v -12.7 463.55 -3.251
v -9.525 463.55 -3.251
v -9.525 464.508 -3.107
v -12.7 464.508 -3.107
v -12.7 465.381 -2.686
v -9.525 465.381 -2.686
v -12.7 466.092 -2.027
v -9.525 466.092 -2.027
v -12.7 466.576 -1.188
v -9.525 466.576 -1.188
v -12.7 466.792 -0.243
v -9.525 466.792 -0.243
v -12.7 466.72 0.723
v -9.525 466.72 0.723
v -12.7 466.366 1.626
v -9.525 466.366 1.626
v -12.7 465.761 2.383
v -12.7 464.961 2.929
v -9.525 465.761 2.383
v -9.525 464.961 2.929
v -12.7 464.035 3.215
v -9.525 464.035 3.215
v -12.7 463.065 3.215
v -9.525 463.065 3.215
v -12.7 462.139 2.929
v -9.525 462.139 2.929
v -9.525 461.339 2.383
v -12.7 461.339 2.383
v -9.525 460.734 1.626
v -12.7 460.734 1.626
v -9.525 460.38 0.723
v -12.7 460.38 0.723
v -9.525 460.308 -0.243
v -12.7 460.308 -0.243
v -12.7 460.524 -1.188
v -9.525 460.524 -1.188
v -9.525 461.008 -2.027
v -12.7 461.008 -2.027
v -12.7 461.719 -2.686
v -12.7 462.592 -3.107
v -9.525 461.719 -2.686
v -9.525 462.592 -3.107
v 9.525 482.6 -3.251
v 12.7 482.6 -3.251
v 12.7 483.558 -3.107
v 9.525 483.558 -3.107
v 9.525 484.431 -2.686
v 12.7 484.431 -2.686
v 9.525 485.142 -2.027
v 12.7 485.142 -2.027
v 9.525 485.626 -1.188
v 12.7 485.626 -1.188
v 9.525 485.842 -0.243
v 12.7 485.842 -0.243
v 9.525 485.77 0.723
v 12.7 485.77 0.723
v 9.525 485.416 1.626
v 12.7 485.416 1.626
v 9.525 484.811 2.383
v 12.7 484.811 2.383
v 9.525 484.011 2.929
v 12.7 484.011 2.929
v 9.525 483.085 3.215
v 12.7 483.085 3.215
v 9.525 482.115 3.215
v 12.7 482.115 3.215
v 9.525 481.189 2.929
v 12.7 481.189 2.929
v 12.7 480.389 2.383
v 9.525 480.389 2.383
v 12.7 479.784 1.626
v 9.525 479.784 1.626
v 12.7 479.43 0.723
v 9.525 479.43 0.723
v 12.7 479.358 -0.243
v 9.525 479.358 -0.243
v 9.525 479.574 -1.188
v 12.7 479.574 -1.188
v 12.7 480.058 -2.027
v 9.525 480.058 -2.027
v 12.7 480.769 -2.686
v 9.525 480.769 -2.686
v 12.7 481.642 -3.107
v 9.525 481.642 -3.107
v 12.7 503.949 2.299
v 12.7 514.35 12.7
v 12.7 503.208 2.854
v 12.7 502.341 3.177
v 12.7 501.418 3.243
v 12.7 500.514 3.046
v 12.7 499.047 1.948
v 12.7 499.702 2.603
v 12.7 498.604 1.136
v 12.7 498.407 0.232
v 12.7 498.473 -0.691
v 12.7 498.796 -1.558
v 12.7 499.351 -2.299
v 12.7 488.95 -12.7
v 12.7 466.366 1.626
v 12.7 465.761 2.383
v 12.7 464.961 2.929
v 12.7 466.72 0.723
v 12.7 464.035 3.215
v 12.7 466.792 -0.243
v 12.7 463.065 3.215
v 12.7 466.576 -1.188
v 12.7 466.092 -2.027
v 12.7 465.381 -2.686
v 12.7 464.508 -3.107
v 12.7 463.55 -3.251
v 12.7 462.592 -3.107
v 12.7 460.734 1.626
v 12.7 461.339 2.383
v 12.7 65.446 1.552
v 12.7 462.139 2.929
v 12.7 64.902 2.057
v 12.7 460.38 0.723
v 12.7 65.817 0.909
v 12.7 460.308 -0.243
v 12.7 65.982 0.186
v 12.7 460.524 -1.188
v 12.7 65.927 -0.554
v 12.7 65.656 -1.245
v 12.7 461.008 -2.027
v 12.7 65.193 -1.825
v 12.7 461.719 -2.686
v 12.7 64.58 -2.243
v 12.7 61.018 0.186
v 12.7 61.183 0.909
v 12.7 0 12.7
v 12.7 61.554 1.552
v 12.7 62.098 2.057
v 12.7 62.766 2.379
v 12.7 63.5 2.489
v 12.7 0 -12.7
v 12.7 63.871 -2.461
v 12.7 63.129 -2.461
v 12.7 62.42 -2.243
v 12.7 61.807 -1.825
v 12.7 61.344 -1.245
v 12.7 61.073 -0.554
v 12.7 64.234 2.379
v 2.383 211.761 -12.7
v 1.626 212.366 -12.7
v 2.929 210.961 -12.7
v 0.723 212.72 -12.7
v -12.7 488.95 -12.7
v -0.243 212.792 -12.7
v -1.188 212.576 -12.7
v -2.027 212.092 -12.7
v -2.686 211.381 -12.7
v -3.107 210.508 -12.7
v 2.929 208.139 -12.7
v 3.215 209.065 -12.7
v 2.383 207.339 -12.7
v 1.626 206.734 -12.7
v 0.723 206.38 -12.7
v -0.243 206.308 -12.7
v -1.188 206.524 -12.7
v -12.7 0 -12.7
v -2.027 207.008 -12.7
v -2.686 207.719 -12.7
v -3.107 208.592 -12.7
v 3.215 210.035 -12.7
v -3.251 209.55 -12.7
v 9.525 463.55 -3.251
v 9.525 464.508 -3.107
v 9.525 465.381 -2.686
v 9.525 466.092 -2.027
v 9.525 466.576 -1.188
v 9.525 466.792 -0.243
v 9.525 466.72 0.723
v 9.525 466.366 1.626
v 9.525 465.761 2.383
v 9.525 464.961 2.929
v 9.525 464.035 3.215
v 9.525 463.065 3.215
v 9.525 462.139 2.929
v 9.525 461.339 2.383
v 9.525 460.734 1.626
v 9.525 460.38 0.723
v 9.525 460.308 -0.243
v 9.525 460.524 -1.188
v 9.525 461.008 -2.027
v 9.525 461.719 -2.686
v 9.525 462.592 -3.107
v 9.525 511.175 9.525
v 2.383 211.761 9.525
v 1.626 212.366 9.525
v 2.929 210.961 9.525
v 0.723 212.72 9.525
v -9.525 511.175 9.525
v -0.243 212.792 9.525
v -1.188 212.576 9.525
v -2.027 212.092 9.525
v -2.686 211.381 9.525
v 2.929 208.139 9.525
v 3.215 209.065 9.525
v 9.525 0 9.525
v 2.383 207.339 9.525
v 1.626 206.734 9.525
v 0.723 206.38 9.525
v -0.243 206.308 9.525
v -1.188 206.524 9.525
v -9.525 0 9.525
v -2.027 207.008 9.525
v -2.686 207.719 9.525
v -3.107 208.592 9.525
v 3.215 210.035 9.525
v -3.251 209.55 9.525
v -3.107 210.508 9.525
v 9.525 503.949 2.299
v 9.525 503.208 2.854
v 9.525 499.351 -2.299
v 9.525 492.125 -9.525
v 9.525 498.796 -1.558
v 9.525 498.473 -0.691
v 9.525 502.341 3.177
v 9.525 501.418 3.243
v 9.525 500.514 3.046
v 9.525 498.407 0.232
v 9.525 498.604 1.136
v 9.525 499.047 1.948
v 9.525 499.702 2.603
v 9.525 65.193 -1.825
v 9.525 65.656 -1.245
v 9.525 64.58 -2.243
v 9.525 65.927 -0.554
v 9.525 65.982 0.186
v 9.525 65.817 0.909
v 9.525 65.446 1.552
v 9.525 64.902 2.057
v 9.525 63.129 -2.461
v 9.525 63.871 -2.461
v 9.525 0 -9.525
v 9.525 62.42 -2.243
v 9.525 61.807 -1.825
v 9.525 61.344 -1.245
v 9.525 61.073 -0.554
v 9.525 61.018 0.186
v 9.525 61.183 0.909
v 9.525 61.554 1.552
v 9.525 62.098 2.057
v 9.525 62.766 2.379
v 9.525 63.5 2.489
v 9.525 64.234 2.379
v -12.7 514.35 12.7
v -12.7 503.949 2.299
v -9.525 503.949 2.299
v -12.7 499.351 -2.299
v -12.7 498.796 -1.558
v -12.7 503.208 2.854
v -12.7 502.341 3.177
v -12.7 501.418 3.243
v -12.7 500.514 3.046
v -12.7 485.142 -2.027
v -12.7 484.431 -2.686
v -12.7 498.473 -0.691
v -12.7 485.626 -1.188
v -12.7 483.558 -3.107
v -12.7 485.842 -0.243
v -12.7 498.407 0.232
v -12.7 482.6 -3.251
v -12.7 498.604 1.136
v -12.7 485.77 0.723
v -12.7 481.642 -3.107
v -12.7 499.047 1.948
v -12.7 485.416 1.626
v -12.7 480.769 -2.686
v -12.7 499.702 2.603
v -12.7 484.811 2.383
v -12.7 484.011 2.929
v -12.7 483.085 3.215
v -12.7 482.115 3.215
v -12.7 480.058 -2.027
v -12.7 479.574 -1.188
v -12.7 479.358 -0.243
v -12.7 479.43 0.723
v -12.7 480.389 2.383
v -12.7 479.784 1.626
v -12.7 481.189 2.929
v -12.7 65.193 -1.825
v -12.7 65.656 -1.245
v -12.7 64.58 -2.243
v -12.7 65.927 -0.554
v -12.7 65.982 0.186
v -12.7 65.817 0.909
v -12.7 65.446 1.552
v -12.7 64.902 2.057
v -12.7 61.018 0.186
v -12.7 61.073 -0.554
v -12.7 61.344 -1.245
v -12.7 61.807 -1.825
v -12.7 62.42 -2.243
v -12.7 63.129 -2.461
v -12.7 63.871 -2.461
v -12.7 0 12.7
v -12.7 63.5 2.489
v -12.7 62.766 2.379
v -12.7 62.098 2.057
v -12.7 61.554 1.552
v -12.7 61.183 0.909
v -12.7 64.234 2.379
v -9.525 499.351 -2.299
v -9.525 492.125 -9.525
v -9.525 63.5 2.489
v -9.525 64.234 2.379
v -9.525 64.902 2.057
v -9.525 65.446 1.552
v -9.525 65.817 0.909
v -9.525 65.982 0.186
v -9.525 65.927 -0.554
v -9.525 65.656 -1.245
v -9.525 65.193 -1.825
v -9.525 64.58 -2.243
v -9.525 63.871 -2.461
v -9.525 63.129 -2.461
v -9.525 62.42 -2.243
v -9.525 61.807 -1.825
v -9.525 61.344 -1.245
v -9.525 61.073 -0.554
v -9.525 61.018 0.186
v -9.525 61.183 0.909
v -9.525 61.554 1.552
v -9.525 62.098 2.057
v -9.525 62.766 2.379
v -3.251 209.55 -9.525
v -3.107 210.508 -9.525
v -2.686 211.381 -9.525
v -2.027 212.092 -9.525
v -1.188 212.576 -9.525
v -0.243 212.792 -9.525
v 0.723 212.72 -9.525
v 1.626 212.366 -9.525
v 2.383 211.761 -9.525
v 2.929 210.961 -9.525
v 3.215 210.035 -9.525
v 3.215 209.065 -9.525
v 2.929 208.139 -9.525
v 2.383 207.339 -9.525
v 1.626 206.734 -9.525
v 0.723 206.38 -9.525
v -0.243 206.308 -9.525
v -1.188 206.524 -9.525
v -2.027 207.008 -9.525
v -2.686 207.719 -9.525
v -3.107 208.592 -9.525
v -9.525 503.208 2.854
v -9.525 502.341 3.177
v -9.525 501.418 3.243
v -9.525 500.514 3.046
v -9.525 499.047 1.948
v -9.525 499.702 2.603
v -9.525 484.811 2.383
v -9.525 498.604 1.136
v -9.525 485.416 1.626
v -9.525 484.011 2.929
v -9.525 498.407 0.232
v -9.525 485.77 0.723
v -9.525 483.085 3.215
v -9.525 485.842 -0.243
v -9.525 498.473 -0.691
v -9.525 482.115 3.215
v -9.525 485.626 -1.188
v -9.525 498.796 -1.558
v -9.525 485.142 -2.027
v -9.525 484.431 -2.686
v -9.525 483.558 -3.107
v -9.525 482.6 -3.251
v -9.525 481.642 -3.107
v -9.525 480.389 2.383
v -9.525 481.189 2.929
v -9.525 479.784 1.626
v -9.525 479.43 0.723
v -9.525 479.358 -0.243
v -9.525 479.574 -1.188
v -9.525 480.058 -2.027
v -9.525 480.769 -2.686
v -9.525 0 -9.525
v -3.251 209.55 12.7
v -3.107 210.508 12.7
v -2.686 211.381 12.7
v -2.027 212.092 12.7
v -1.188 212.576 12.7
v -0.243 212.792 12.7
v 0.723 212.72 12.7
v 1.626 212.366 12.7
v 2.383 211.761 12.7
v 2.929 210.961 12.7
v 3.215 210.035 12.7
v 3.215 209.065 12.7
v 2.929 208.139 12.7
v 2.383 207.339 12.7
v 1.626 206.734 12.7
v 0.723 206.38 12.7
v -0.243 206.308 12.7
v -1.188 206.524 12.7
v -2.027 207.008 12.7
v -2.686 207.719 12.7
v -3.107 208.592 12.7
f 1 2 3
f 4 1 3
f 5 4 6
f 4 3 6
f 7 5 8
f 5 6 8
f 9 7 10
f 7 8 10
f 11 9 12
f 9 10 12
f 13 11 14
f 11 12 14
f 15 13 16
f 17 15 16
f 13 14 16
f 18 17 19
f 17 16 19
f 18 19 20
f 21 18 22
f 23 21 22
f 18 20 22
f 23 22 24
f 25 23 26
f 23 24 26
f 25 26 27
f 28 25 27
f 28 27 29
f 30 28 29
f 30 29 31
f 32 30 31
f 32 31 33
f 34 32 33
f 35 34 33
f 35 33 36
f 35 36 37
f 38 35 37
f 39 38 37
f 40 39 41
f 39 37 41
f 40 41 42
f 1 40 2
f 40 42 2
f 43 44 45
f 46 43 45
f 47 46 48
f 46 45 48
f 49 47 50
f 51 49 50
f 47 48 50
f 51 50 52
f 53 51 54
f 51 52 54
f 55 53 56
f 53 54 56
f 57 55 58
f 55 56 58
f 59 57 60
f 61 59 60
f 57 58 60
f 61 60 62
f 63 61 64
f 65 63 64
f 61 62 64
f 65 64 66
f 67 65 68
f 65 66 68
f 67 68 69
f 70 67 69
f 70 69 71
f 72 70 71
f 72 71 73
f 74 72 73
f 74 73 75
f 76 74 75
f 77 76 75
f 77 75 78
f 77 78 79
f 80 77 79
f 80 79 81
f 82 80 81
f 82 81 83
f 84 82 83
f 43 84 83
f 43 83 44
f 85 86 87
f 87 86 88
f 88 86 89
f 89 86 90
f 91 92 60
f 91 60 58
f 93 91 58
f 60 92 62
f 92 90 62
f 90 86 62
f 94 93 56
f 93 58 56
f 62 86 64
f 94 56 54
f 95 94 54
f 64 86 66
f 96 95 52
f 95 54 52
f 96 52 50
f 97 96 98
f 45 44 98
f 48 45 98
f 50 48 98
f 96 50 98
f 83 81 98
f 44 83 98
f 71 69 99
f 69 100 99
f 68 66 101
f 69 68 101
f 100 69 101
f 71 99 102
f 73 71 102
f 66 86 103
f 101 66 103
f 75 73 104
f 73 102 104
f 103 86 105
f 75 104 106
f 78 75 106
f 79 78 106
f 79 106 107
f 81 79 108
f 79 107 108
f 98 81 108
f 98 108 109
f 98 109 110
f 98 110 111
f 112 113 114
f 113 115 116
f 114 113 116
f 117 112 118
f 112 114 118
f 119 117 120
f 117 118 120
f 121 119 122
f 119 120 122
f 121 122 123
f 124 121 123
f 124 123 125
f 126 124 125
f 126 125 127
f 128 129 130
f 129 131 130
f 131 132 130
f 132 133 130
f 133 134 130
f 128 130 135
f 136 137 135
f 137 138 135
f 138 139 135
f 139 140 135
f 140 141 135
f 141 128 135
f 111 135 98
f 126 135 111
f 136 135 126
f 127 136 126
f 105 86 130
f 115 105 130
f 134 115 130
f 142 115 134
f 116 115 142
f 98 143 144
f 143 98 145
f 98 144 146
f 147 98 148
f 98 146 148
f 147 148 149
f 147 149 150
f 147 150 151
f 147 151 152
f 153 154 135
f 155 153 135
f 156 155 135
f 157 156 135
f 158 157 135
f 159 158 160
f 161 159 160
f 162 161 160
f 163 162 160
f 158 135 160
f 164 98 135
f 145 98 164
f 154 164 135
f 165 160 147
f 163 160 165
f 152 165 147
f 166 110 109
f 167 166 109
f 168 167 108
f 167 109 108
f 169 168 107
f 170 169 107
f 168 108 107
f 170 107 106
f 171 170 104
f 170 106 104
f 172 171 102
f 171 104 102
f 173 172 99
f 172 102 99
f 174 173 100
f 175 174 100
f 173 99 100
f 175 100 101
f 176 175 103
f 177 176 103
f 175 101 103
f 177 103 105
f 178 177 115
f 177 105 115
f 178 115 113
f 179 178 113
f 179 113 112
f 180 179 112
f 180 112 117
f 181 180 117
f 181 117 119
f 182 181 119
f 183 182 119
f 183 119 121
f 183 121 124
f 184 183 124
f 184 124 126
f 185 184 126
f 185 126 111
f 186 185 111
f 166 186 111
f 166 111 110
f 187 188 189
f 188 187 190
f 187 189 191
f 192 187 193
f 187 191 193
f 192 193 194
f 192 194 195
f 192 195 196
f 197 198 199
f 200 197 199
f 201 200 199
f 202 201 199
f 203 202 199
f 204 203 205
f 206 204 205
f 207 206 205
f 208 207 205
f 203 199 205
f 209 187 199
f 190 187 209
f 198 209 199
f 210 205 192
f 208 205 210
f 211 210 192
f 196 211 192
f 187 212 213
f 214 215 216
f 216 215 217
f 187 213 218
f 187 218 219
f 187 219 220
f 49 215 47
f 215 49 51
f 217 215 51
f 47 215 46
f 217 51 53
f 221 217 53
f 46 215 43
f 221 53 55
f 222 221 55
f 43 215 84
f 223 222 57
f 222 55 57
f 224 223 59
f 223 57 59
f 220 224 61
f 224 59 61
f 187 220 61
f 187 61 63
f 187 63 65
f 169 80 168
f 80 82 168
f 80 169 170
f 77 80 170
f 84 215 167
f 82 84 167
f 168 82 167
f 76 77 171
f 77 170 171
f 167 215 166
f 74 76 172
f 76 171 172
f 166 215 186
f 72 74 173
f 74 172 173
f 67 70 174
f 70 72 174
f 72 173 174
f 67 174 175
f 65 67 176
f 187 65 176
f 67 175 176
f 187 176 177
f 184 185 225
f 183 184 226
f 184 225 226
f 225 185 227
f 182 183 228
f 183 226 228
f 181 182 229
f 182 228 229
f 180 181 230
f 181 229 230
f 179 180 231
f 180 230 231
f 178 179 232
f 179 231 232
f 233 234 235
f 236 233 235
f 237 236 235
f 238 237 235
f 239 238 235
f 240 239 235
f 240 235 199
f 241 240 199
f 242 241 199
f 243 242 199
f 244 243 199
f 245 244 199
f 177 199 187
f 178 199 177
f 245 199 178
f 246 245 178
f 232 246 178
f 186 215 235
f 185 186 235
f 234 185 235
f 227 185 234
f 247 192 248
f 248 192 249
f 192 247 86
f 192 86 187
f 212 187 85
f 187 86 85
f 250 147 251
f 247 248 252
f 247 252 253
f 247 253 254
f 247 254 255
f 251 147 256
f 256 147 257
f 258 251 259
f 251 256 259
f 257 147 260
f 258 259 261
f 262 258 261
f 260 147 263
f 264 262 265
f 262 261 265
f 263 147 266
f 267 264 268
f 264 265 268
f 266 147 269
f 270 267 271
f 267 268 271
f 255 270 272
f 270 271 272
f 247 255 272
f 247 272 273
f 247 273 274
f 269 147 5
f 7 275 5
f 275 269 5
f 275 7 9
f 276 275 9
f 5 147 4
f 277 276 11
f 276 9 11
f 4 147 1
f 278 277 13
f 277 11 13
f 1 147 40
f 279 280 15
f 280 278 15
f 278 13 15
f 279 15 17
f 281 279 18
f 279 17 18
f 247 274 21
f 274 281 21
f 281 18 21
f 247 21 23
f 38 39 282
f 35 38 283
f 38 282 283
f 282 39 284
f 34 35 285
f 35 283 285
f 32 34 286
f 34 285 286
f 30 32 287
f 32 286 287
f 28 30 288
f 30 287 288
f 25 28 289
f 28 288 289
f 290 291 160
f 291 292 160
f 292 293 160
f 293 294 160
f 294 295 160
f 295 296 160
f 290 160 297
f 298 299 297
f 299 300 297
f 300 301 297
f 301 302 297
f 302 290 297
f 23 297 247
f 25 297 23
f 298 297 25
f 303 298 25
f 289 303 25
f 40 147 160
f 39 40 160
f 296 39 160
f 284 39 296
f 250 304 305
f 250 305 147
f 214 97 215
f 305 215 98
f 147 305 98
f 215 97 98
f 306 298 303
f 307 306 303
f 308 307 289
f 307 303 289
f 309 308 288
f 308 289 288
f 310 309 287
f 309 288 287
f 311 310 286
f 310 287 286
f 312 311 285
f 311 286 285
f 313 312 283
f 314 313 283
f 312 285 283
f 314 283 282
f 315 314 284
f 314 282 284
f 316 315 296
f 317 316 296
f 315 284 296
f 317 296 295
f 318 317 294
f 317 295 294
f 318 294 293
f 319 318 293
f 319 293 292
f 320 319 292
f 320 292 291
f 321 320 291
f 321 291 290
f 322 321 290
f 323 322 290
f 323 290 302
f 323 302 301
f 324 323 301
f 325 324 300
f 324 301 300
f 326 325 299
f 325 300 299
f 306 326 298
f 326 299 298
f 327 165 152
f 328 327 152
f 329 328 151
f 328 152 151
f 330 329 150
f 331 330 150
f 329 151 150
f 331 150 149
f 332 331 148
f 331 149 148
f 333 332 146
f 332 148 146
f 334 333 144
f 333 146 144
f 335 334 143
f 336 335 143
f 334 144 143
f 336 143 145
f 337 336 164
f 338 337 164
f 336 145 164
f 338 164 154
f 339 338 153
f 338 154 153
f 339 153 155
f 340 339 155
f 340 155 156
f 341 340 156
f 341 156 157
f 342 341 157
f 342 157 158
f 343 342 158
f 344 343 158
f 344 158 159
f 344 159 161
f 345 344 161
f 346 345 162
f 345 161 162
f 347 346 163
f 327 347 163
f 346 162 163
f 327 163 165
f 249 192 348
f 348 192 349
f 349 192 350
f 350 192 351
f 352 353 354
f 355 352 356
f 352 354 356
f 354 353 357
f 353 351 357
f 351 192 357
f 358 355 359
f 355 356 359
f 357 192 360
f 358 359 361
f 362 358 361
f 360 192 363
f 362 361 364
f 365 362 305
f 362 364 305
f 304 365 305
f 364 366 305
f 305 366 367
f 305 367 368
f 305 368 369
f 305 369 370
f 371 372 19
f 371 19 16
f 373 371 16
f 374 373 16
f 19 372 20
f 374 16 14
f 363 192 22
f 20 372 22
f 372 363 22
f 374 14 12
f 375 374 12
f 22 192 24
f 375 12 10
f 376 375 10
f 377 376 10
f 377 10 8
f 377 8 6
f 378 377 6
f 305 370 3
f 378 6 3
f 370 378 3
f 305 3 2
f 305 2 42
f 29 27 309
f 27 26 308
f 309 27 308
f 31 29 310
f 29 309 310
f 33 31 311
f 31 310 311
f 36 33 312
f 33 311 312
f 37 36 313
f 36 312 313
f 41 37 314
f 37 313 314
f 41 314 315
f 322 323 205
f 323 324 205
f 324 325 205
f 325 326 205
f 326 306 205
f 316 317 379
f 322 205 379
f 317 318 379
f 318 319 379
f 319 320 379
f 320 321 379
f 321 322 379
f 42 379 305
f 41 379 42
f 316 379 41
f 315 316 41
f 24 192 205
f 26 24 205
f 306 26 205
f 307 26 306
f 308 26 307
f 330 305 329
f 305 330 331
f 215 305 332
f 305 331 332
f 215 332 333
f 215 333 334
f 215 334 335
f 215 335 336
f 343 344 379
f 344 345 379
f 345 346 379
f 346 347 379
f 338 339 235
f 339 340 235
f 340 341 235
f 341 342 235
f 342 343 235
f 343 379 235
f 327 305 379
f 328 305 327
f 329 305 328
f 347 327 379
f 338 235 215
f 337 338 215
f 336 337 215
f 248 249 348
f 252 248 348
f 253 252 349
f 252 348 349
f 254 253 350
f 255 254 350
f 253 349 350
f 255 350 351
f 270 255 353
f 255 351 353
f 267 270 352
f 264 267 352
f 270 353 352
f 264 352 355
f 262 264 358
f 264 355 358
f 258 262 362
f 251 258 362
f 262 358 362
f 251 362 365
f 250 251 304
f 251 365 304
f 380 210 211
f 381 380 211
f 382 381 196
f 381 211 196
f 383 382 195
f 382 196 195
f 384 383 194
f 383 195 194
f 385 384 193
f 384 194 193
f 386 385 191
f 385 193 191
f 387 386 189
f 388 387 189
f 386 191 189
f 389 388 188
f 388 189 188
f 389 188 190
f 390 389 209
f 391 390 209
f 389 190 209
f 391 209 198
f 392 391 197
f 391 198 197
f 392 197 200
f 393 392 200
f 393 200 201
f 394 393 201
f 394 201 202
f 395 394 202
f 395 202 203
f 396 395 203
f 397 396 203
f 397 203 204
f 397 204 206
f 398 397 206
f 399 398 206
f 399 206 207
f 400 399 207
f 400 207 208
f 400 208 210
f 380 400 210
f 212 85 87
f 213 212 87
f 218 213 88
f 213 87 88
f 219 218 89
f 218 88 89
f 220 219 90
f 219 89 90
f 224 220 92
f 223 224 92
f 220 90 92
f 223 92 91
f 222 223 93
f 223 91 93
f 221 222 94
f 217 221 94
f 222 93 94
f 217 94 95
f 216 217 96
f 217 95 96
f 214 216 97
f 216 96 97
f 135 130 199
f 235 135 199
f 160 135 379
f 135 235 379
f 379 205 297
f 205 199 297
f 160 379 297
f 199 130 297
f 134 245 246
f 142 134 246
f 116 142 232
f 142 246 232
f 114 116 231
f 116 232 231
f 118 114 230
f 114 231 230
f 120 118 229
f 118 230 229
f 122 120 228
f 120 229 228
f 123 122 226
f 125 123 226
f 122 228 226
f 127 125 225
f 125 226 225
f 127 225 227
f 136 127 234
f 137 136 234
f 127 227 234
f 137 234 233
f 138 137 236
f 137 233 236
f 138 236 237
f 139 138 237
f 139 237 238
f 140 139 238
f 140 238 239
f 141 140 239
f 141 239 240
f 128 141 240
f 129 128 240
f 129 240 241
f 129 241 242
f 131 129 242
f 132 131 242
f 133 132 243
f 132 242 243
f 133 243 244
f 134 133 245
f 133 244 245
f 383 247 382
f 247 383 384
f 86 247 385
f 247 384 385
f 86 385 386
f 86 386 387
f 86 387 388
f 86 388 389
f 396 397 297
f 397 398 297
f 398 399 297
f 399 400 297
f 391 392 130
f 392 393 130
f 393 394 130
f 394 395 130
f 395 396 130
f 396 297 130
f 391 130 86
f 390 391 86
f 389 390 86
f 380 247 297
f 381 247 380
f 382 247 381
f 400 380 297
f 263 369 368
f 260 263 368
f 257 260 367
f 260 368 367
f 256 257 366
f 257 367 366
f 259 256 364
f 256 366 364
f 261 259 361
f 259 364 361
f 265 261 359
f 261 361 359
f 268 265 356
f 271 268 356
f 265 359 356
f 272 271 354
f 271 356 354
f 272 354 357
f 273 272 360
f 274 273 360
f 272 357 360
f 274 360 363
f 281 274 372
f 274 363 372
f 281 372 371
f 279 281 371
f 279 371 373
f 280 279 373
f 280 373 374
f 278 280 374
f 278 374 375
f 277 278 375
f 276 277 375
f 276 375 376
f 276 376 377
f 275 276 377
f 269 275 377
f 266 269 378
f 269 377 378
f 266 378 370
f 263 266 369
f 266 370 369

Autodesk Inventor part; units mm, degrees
ref_plane "YZ Plane" through (0, 0, 0) normal (1, 0, 0) x (0, 1, 0)
ref_plane "XZ Plane" through (0, 0, 0) normal (0, 1, 0) x (-1, 0, 0)
ref_plane "XY Plane" through (0, 0, 0) normal (0, 0, 1) x (1, 0, 0)
sketch "Sketch1" plane through (0, 0, 0) normal (0, 1, 0) x (-1, 0, 0)
  line L0 (-12.7, -12.7) -> (12.7, -12.7)
  line L1 (12.7, -12.7) -> (12.7, 12.7)
  line L2 (12.7, 12.7) -> (-12.7, 12.7)
  line L3 (-12.7, 12.7) -> (-12.7, -12.7)
  line L4 (-12.7, -12.7) -> (12.7, 12.7) construction
  line L5 (12.7, -12.7) -> (-12.7, 12.7) construction
  line L6 (9.525, 9.525) -> (9.525, -9.525)
  line L7 (9.525, -9.525) -> (-9.525, -9.525)
  line L8 (-9.525, -9.525) -> (-9.525, 9.525)
  line L9 (-9.525, 9.525) -> (9.525, 9.525)
  point P0 (0, 0)
  dimension "d0" = 25.4
  dimension "d1" = 25.4
  dimension "d2" = 3.175
extrude "Extrusion1" add sketch "Sketch1" along normal blind 514.35
sketch "Sketch2" plane through (12.7, 0, 12.7) normal (1, 0, 0) x (0, 0, -1)
  line L0 (25.4, 514.35) -> (0, 514.35) projected
  line L1 (0, 514.35) -> (25.4, 488.95)
  line L2 (25.4, 0) -> (25.4, 514.35) projected
  circle A0 centre (12.7, 482.6) radius 3.2512
  line L3 (0, 514.35) -> (25.4, 514.35) projected
  circle A1 centre (12.7, 463.55) radius 3.2512
  circle A2 centre (12.7, 501.65) radius 3.2512
  point P0 (12.7, 0)
  point P1 (12.7, 514.35)
  point P2 (12.7, 514.35)
  point P3 (14.9989, 499.3511)
  point P4 (10.4011, 503.9489)
  dimension "d5" = 25.4
  dimension "d6" = 6.5024
  dimension "d7" = 31.75
  dimension "d8" = 19.05
extrude "Extrusion2" cut sketch "Sketch2" against normal blind 522.224
sketch "Sketch5" plane through (12.7, 0, -12.7) normal (0, 0, -1) x (-1, 0, 0)
  circle A0 centre (12.7, 209.55) radius 3.2512
  line L0 (0, 0) -> (25.4, 0) projected
  line L1 (25.4, 514.35) -> (0, 514.35) projected
  point P0 (12.7, 0)
  point P1 (12.7, 0)
  point P2 (12.7, 514.35)
  dimension "d11" = 6.5024
  dimension "d15" = 304.8
extrude "Extrusion3" cut sketch "Sketch5" against normal blind 25.4
sketch "Sketch6" plane through (-12.7, 0, -12.7) normal (-1, 0, 0) x (0, 0, 1)
  line L0 (12.7, 0) -> (12.7, 63.5)
  circle A0 centre (12.7, 63.5) radius 2.4892
  dimension "d16" = 63.5
  dimension "d17" = 4.9784
extrude "Extrusion4" cut sketch "Sketch6" against normal blind 25.4
properties part number "STRU_002_BilletPole_20.56in_Angled" material "Aluminum 6061"
